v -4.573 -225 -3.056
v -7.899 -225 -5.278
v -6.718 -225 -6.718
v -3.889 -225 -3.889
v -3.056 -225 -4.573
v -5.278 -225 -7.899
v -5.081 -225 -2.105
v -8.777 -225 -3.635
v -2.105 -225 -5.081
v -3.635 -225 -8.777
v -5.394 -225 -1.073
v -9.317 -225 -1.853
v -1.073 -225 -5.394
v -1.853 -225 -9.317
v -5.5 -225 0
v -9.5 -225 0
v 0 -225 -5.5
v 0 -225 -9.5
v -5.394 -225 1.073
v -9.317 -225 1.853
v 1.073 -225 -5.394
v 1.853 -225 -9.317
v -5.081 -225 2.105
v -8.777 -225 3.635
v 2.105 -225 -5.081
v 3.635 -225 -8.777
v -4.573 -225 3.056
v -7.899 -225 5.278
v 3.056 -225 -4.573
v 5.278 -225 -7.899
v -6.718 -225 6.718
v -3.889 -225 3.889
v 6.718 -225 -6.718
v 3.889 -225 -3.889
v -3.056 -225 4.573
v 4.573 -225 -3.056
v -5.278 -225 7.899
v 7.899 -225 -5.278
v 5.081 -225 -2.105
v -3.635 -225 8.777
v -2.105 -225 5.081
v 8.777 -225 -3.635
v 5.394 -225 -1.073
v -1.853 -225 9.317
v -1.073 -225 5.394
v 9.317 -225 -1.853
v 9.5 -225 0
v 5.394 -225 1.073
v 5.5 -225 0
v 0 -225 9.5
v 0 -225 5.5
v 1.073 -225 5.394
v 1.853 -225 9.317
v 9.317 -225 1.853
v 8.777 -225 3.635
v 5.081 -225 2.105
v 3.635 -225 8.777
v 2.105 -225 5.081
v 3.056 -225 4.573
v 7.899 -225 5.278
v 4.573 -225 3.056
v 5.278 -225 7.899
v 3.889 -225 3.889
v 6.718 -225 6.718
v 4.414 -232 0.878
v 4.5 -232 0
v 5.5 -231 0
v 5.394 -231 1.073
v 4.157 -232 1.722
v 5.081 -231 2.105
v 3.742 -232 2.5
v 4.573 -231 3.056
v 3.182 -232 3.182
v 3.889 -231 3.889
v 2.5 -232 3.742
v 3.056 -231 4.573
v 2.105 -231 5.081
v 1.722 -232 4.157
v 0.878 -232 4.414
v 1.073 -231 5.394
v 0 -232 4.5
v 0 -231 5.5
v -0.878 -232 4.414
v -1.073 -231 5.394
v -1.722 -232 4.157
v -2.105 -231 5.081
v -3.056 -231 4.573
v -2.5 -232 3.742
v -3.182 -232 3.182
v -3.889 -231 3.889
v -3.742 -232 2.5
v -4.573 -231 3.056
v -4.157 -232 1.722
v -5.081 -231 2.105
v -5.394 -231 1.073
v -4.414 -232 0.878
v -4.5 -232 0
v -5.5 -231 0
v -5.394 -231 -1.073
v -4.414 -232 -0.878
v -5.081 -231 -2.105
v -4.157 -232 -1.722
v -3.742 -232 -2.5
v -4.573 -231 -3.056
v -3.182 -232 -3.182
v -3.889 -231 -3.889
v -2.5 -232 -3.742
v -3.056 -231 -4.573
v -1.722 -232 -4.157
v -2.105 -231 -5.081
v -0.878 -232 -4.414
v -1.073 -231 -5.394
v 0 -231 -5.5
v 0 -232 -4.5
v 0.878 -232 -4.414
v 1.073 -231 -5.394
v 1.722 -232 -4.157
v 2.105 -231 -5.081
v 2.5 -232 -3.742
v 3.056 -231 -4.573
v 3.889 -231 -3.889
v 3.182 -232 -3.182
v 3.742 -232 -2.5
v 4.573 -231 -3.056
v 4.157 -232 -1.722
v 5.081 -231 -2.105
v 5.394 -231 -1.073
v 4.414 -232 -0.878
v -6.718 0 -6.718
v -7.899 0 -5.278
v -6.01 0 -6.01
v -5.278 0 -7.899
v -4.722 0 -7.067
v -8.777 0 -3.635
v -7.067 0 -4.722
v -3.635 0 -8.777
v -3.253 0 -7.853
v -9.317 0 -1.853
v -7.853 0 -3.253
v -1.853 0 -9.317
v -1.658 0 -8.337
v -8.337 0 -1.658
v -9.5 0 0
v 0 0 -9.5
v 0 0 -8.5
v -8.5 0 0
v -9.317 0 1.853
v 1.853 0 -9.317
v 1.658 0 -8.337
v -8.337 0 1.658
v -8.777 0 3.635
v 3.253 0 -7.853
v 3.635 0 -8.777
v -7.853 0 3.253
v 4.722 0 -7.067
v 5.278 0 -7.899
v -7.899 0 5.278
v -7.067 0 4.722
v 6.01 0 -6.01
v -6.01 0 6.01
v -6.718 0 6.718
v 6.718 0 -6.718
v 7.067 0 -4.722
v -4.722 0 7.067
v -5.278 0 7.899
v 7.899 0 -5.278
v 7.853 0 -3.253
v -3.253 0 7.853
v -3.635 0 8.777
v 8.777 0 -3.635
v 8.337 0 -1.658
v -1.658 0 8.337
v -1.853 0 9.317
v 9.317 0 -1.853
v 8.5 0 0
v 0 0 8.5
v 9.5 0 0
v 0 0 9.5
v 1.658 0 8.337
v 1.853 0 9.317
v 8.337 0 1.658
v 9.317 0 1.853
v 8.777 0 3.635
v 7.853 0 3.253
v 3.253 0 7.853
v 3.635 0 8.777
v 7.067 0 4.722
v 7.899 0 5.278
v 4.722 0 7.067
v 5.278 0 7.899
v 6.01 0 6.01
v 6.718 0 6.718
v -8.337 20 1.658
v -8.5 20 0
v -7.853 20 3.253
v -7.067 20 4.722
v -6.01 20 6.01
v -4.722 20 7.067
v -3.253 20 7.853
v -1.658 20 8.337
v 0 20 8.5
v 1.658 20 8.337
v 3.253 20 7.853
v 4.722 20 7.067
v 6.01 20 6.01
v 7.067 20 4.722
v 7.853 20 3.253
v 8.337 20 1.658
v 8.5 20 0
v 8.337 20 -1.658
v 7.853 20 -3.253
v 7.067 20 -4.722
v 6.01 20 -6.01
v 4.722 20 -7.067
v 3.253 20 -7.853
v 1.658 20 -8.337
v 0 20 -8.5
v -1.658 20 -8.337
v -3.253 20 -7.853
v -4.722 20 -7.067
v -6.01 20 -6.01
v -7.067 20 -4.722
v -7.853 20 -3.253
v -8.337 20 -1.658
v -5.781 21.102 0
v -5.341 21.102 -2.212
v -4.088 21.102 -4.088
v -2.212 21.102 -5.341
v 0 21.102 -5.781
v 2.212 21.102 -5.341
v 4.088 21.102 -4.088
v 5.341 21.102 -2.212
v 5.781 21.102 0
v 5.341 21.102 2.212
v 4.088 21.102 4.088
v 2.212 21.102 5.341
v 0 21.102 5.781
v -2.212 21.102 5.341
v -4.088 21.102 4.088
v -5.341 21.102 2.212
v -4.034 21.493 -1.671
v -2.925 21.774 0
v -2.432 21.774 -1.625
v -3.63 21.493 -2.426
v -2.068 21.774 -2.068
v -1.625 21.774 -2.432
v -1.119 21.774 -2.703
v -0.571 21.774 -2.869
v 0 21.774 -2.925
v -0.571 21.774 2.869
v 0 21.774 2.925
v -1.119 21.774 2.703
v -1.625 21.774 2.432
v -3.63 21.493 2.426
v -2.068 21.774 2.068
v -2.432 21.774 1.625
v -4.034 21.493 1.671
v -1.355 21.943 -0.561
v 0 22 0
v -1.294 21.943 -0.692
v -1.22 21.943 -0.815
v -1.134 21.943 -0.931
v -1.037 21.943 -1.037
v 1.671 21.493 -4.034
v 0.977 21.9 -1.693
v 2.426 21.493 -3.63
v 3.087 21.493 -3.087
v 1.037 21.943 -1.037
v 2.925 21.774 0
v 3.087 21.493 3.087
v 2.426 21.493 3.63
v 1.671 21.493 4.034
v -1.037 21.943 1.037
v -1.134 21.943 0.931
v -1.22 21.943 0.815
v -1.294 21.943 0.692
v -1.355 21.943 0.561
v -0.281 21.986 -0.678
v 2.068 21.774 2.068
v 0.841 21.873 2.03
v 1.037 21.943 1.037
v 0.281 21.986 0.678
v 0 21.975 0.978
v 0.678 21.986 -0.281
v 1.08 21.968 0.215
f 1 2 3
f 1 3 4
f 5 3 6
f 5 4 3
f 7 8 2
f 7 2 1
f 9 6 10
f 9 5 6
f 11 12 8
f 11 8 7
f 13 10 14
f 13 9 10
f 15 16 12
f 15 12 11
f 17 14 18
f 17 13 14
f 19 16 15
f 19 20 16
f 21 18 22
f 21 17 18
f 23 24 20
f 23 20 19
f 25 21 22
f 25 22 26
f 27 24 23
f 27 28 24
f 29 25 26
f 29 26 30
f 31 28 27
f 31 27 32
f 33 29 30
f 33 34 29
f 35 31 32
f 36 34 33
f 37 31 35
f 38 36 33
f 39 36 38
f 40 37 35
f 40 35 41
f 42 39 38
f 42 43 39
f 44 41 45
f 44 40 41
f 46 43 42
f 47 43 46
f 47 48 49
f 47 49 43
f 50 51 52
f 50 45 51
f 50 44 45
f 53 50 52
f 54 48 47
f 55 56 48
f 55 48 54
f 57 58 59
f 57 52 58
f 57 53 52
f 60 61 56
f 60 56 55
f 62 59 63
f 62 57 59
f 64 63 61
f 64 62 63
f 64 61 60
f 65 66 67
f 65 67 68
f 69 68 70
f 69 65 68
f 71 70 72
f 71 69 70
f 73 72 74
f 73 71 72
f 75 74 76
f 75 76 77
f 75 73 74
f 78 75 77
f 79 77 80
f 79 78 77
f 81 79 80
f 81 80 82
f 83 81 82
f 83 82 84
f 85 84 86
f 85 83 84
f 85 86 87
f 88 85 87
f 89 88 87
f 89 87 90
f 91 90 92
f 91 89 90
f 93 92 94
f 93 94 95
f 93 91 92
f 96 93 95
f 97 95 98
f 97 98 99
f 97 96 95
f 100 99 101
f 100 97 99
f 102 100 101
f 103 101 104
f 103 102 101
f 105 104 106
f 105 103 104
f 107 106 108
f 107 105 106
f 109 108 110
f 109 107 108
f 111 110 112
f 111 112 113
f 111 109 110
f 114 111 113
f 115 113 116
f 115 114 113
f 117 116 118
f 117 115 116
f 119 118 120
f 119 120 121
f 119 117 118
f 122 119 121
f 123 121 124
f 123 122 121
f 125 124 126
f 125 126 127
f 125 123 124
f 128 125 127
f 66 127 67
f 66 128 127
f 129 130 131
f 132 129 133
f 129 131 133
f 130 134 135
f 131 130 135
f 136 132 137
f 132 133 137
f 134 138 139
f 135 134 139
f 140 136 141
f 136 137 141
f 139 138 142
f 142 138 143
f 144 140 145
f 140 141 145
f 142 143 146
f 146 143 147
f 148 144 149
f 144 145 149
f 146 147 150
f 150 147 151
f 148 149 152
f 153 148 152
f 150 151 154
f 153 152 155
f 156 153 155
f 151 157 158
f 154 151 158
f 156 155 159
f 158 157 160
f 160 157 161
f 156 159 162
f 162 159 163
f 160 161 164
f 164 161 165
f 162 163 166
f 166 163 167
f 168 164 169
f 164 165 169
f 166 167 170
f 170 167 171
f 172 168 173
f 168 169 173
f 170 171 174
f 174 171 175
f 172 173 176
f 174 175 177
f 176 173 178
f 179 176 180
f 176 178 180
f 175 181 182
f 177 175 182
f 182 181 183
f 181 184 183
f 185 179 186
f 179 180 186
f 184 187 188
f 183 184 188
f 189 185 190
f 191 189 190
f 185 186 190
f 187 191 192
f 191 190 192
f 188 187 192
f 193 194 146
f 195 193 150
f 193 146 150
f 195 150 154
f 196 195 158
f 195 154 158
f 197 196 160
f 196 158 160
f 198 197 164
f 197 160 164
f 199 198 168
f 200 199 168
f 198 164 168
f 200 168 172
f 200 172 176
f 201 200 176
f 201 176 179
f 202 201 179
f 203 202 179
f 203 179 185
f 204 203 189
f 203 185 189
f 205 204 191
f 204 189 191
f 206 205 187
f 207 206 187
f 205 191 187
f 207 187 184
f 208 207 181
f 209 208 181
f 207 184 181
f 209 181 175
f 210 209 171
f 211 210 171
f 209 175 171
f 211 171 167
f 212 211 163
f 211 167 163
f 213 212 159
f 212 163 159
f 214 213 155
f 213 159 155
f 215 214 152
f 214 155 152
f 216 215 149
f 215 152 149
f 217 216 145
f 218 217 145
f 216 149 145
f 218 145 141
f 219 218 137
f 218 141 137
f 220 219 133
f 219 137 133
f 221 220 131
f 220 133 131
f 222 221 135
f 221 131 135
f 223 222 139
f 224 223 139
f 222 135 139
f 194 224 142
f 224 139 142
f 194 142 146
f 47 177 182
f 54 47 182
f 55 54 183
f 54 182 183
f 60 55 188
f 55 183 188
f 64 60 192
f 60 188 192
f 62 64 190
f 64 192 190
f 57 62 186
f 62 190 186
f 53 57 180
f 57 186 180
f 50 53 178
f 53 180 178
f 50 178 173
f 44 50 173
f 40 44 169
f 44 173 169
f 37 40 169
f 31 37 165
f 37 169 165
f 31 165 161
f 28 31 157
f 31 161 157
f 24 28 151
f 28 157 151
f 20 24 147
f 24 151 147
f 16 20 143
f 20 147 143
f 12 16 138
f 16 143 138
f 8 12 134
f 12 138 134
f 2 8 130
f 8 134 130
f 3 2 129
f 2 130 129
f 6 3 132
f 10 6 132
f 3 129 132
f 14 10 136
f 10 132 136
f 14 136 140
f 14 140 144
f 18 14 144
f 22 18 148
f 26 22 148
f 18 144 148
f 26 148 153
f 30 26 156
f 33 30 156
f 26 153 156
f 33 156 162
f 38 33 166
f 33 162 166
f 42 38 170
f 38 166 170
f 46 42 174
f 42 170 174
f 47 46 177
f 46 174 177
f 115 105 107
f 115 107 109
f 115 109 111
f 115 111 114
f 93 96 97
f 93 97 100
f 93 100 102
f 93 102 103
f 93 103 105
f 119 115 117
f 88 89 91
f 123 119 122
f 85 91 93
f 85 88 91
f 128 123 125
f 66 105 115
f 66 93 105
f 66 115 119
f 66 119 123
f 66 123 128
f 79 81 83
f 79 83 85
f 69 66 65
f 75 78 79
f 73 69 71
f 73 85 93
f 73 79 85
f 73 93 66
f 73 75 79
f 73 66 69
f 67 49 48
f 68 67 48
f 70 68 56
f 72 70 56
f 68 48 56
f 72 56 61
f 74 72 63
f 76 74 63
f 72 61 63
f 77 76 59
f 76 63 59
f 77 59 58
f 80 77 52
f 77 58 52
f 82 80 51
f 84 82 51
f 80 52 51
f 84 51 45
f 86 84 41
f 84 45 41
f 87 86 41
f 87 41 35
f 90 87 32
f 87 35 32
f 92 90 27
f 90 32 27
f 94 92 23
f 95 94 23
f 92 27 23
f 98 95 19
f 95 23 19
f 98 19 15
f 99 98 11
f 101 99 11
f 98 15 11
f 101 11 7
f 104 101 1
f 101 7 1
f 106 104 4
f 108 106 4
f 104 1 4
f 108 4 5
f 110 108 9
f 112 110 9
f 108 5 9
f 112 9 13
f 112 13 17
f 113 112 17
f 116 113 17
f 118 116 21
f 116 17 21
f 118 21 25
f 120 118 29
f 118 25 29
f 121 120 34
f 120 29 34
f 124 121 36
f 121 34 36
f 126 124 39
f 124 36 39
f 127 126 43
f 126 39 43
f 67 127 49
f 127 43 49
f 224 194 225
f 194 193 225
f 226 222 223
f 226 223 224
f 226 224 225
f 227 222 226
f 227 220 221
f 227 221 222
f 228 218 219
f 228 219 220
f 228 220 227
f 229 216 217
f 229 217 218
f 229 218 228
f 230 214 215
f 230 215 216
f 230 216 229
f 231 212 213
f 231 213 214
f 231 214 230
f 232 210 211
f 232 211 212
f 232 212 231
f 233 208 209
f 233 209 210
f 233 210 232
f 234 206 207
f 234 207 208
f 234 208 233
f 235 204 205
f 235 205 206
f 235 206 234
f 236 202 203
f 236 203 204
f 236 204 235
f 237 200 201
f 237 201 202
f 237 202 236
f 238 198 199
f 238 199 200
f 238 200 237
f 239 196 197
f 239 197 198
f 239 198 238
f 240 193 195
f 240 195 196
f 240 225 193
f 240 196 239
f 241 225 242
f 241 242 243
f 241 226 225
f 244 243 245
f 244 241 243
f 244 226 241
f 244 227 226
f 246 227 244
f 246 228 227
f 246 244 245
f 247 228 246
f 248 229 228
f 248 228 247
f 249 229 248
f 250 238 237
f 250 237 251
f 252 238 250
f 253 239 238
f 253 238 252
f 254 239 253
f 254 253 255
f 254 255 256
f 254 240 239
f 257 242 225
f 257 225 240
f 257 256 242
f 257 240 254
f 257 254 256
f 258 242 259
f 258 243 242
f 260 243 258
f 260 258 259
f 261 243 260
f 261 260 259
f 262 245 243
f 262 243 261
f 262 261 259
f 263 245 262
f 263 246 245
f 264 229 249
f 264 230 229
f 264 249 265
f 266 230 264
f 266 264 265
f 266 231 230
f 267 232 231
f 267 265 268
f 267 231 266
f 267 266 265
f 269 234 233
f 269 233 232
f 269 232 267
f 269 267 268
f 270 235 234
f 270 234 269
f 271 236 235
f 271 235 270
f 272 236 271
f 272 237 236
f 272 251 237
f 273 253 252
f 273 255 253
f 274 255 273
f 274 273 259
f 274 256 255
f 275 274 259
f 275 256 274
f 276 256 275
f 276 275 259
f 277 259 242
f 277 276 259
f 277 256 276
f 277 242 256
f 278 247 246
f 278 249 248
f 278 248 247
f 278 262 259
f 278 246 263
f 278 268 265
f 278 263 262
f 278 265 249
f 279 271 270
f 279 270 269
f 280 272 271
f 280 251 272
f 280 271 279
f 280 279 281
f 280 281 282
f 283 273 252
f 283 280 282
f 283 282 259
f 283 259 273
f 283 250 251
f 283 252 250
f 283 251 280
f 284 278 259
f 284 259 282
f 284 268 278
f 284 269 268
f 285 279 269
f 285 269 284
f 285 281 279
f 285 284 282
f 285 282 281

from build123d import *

# Parameters (mm, degrees)
F0_R     = 9.5
F1_DEPTH = 225
F2_R     = 5.5
F3_DEPTH = 7
F4_SIZE  = 1
F5_R     = 8.5
F6_DEPTH = 20


with BuildPart() as f1:
    # F0 (on Front) → F1 (new body)
    with BuildSketch(Plane.XZ):
        Circle(F0_R)
    extrude(amount=F1_DEPTH)

    # F2 (on face) → F3 (join)
    with BuildSketch(Plane.XZ.offset(225)):
        Circle(F2_R)
    extrude(amount=F3_DEPTH)

    # F4
    f4_edges = [f1.edges().sort_by_distance(p)[0] for p in [
        (-5.5, -232, 0),
    ]]
    chamfer(f4_edges, length=F4_SIZE)

    # F5 (on face) → F6 (join)
    with BuildSketch(Plane(origin=(0, 0, 0), x_dir=(-1, 0, 0), z_dir=(0, 1, 0))):
        Circle(F5_R)
    extrude(amount=F6_DEPTH)

    # F7 (on Top) → F8 (revolve)
    with BuildSketch(Plane.XY):
        with BuildLine():
            Line((-8.5, 20), (0, 20))
            Line((0, 20), (0, 22))
            ThreePointArc((0, 22), (-4.366062, 21.493265), (-8.5, 20))
        make_face()
    revolve(axis=Axis((0, 10, 0), (0, -1, 0)))


solid = f1.part
